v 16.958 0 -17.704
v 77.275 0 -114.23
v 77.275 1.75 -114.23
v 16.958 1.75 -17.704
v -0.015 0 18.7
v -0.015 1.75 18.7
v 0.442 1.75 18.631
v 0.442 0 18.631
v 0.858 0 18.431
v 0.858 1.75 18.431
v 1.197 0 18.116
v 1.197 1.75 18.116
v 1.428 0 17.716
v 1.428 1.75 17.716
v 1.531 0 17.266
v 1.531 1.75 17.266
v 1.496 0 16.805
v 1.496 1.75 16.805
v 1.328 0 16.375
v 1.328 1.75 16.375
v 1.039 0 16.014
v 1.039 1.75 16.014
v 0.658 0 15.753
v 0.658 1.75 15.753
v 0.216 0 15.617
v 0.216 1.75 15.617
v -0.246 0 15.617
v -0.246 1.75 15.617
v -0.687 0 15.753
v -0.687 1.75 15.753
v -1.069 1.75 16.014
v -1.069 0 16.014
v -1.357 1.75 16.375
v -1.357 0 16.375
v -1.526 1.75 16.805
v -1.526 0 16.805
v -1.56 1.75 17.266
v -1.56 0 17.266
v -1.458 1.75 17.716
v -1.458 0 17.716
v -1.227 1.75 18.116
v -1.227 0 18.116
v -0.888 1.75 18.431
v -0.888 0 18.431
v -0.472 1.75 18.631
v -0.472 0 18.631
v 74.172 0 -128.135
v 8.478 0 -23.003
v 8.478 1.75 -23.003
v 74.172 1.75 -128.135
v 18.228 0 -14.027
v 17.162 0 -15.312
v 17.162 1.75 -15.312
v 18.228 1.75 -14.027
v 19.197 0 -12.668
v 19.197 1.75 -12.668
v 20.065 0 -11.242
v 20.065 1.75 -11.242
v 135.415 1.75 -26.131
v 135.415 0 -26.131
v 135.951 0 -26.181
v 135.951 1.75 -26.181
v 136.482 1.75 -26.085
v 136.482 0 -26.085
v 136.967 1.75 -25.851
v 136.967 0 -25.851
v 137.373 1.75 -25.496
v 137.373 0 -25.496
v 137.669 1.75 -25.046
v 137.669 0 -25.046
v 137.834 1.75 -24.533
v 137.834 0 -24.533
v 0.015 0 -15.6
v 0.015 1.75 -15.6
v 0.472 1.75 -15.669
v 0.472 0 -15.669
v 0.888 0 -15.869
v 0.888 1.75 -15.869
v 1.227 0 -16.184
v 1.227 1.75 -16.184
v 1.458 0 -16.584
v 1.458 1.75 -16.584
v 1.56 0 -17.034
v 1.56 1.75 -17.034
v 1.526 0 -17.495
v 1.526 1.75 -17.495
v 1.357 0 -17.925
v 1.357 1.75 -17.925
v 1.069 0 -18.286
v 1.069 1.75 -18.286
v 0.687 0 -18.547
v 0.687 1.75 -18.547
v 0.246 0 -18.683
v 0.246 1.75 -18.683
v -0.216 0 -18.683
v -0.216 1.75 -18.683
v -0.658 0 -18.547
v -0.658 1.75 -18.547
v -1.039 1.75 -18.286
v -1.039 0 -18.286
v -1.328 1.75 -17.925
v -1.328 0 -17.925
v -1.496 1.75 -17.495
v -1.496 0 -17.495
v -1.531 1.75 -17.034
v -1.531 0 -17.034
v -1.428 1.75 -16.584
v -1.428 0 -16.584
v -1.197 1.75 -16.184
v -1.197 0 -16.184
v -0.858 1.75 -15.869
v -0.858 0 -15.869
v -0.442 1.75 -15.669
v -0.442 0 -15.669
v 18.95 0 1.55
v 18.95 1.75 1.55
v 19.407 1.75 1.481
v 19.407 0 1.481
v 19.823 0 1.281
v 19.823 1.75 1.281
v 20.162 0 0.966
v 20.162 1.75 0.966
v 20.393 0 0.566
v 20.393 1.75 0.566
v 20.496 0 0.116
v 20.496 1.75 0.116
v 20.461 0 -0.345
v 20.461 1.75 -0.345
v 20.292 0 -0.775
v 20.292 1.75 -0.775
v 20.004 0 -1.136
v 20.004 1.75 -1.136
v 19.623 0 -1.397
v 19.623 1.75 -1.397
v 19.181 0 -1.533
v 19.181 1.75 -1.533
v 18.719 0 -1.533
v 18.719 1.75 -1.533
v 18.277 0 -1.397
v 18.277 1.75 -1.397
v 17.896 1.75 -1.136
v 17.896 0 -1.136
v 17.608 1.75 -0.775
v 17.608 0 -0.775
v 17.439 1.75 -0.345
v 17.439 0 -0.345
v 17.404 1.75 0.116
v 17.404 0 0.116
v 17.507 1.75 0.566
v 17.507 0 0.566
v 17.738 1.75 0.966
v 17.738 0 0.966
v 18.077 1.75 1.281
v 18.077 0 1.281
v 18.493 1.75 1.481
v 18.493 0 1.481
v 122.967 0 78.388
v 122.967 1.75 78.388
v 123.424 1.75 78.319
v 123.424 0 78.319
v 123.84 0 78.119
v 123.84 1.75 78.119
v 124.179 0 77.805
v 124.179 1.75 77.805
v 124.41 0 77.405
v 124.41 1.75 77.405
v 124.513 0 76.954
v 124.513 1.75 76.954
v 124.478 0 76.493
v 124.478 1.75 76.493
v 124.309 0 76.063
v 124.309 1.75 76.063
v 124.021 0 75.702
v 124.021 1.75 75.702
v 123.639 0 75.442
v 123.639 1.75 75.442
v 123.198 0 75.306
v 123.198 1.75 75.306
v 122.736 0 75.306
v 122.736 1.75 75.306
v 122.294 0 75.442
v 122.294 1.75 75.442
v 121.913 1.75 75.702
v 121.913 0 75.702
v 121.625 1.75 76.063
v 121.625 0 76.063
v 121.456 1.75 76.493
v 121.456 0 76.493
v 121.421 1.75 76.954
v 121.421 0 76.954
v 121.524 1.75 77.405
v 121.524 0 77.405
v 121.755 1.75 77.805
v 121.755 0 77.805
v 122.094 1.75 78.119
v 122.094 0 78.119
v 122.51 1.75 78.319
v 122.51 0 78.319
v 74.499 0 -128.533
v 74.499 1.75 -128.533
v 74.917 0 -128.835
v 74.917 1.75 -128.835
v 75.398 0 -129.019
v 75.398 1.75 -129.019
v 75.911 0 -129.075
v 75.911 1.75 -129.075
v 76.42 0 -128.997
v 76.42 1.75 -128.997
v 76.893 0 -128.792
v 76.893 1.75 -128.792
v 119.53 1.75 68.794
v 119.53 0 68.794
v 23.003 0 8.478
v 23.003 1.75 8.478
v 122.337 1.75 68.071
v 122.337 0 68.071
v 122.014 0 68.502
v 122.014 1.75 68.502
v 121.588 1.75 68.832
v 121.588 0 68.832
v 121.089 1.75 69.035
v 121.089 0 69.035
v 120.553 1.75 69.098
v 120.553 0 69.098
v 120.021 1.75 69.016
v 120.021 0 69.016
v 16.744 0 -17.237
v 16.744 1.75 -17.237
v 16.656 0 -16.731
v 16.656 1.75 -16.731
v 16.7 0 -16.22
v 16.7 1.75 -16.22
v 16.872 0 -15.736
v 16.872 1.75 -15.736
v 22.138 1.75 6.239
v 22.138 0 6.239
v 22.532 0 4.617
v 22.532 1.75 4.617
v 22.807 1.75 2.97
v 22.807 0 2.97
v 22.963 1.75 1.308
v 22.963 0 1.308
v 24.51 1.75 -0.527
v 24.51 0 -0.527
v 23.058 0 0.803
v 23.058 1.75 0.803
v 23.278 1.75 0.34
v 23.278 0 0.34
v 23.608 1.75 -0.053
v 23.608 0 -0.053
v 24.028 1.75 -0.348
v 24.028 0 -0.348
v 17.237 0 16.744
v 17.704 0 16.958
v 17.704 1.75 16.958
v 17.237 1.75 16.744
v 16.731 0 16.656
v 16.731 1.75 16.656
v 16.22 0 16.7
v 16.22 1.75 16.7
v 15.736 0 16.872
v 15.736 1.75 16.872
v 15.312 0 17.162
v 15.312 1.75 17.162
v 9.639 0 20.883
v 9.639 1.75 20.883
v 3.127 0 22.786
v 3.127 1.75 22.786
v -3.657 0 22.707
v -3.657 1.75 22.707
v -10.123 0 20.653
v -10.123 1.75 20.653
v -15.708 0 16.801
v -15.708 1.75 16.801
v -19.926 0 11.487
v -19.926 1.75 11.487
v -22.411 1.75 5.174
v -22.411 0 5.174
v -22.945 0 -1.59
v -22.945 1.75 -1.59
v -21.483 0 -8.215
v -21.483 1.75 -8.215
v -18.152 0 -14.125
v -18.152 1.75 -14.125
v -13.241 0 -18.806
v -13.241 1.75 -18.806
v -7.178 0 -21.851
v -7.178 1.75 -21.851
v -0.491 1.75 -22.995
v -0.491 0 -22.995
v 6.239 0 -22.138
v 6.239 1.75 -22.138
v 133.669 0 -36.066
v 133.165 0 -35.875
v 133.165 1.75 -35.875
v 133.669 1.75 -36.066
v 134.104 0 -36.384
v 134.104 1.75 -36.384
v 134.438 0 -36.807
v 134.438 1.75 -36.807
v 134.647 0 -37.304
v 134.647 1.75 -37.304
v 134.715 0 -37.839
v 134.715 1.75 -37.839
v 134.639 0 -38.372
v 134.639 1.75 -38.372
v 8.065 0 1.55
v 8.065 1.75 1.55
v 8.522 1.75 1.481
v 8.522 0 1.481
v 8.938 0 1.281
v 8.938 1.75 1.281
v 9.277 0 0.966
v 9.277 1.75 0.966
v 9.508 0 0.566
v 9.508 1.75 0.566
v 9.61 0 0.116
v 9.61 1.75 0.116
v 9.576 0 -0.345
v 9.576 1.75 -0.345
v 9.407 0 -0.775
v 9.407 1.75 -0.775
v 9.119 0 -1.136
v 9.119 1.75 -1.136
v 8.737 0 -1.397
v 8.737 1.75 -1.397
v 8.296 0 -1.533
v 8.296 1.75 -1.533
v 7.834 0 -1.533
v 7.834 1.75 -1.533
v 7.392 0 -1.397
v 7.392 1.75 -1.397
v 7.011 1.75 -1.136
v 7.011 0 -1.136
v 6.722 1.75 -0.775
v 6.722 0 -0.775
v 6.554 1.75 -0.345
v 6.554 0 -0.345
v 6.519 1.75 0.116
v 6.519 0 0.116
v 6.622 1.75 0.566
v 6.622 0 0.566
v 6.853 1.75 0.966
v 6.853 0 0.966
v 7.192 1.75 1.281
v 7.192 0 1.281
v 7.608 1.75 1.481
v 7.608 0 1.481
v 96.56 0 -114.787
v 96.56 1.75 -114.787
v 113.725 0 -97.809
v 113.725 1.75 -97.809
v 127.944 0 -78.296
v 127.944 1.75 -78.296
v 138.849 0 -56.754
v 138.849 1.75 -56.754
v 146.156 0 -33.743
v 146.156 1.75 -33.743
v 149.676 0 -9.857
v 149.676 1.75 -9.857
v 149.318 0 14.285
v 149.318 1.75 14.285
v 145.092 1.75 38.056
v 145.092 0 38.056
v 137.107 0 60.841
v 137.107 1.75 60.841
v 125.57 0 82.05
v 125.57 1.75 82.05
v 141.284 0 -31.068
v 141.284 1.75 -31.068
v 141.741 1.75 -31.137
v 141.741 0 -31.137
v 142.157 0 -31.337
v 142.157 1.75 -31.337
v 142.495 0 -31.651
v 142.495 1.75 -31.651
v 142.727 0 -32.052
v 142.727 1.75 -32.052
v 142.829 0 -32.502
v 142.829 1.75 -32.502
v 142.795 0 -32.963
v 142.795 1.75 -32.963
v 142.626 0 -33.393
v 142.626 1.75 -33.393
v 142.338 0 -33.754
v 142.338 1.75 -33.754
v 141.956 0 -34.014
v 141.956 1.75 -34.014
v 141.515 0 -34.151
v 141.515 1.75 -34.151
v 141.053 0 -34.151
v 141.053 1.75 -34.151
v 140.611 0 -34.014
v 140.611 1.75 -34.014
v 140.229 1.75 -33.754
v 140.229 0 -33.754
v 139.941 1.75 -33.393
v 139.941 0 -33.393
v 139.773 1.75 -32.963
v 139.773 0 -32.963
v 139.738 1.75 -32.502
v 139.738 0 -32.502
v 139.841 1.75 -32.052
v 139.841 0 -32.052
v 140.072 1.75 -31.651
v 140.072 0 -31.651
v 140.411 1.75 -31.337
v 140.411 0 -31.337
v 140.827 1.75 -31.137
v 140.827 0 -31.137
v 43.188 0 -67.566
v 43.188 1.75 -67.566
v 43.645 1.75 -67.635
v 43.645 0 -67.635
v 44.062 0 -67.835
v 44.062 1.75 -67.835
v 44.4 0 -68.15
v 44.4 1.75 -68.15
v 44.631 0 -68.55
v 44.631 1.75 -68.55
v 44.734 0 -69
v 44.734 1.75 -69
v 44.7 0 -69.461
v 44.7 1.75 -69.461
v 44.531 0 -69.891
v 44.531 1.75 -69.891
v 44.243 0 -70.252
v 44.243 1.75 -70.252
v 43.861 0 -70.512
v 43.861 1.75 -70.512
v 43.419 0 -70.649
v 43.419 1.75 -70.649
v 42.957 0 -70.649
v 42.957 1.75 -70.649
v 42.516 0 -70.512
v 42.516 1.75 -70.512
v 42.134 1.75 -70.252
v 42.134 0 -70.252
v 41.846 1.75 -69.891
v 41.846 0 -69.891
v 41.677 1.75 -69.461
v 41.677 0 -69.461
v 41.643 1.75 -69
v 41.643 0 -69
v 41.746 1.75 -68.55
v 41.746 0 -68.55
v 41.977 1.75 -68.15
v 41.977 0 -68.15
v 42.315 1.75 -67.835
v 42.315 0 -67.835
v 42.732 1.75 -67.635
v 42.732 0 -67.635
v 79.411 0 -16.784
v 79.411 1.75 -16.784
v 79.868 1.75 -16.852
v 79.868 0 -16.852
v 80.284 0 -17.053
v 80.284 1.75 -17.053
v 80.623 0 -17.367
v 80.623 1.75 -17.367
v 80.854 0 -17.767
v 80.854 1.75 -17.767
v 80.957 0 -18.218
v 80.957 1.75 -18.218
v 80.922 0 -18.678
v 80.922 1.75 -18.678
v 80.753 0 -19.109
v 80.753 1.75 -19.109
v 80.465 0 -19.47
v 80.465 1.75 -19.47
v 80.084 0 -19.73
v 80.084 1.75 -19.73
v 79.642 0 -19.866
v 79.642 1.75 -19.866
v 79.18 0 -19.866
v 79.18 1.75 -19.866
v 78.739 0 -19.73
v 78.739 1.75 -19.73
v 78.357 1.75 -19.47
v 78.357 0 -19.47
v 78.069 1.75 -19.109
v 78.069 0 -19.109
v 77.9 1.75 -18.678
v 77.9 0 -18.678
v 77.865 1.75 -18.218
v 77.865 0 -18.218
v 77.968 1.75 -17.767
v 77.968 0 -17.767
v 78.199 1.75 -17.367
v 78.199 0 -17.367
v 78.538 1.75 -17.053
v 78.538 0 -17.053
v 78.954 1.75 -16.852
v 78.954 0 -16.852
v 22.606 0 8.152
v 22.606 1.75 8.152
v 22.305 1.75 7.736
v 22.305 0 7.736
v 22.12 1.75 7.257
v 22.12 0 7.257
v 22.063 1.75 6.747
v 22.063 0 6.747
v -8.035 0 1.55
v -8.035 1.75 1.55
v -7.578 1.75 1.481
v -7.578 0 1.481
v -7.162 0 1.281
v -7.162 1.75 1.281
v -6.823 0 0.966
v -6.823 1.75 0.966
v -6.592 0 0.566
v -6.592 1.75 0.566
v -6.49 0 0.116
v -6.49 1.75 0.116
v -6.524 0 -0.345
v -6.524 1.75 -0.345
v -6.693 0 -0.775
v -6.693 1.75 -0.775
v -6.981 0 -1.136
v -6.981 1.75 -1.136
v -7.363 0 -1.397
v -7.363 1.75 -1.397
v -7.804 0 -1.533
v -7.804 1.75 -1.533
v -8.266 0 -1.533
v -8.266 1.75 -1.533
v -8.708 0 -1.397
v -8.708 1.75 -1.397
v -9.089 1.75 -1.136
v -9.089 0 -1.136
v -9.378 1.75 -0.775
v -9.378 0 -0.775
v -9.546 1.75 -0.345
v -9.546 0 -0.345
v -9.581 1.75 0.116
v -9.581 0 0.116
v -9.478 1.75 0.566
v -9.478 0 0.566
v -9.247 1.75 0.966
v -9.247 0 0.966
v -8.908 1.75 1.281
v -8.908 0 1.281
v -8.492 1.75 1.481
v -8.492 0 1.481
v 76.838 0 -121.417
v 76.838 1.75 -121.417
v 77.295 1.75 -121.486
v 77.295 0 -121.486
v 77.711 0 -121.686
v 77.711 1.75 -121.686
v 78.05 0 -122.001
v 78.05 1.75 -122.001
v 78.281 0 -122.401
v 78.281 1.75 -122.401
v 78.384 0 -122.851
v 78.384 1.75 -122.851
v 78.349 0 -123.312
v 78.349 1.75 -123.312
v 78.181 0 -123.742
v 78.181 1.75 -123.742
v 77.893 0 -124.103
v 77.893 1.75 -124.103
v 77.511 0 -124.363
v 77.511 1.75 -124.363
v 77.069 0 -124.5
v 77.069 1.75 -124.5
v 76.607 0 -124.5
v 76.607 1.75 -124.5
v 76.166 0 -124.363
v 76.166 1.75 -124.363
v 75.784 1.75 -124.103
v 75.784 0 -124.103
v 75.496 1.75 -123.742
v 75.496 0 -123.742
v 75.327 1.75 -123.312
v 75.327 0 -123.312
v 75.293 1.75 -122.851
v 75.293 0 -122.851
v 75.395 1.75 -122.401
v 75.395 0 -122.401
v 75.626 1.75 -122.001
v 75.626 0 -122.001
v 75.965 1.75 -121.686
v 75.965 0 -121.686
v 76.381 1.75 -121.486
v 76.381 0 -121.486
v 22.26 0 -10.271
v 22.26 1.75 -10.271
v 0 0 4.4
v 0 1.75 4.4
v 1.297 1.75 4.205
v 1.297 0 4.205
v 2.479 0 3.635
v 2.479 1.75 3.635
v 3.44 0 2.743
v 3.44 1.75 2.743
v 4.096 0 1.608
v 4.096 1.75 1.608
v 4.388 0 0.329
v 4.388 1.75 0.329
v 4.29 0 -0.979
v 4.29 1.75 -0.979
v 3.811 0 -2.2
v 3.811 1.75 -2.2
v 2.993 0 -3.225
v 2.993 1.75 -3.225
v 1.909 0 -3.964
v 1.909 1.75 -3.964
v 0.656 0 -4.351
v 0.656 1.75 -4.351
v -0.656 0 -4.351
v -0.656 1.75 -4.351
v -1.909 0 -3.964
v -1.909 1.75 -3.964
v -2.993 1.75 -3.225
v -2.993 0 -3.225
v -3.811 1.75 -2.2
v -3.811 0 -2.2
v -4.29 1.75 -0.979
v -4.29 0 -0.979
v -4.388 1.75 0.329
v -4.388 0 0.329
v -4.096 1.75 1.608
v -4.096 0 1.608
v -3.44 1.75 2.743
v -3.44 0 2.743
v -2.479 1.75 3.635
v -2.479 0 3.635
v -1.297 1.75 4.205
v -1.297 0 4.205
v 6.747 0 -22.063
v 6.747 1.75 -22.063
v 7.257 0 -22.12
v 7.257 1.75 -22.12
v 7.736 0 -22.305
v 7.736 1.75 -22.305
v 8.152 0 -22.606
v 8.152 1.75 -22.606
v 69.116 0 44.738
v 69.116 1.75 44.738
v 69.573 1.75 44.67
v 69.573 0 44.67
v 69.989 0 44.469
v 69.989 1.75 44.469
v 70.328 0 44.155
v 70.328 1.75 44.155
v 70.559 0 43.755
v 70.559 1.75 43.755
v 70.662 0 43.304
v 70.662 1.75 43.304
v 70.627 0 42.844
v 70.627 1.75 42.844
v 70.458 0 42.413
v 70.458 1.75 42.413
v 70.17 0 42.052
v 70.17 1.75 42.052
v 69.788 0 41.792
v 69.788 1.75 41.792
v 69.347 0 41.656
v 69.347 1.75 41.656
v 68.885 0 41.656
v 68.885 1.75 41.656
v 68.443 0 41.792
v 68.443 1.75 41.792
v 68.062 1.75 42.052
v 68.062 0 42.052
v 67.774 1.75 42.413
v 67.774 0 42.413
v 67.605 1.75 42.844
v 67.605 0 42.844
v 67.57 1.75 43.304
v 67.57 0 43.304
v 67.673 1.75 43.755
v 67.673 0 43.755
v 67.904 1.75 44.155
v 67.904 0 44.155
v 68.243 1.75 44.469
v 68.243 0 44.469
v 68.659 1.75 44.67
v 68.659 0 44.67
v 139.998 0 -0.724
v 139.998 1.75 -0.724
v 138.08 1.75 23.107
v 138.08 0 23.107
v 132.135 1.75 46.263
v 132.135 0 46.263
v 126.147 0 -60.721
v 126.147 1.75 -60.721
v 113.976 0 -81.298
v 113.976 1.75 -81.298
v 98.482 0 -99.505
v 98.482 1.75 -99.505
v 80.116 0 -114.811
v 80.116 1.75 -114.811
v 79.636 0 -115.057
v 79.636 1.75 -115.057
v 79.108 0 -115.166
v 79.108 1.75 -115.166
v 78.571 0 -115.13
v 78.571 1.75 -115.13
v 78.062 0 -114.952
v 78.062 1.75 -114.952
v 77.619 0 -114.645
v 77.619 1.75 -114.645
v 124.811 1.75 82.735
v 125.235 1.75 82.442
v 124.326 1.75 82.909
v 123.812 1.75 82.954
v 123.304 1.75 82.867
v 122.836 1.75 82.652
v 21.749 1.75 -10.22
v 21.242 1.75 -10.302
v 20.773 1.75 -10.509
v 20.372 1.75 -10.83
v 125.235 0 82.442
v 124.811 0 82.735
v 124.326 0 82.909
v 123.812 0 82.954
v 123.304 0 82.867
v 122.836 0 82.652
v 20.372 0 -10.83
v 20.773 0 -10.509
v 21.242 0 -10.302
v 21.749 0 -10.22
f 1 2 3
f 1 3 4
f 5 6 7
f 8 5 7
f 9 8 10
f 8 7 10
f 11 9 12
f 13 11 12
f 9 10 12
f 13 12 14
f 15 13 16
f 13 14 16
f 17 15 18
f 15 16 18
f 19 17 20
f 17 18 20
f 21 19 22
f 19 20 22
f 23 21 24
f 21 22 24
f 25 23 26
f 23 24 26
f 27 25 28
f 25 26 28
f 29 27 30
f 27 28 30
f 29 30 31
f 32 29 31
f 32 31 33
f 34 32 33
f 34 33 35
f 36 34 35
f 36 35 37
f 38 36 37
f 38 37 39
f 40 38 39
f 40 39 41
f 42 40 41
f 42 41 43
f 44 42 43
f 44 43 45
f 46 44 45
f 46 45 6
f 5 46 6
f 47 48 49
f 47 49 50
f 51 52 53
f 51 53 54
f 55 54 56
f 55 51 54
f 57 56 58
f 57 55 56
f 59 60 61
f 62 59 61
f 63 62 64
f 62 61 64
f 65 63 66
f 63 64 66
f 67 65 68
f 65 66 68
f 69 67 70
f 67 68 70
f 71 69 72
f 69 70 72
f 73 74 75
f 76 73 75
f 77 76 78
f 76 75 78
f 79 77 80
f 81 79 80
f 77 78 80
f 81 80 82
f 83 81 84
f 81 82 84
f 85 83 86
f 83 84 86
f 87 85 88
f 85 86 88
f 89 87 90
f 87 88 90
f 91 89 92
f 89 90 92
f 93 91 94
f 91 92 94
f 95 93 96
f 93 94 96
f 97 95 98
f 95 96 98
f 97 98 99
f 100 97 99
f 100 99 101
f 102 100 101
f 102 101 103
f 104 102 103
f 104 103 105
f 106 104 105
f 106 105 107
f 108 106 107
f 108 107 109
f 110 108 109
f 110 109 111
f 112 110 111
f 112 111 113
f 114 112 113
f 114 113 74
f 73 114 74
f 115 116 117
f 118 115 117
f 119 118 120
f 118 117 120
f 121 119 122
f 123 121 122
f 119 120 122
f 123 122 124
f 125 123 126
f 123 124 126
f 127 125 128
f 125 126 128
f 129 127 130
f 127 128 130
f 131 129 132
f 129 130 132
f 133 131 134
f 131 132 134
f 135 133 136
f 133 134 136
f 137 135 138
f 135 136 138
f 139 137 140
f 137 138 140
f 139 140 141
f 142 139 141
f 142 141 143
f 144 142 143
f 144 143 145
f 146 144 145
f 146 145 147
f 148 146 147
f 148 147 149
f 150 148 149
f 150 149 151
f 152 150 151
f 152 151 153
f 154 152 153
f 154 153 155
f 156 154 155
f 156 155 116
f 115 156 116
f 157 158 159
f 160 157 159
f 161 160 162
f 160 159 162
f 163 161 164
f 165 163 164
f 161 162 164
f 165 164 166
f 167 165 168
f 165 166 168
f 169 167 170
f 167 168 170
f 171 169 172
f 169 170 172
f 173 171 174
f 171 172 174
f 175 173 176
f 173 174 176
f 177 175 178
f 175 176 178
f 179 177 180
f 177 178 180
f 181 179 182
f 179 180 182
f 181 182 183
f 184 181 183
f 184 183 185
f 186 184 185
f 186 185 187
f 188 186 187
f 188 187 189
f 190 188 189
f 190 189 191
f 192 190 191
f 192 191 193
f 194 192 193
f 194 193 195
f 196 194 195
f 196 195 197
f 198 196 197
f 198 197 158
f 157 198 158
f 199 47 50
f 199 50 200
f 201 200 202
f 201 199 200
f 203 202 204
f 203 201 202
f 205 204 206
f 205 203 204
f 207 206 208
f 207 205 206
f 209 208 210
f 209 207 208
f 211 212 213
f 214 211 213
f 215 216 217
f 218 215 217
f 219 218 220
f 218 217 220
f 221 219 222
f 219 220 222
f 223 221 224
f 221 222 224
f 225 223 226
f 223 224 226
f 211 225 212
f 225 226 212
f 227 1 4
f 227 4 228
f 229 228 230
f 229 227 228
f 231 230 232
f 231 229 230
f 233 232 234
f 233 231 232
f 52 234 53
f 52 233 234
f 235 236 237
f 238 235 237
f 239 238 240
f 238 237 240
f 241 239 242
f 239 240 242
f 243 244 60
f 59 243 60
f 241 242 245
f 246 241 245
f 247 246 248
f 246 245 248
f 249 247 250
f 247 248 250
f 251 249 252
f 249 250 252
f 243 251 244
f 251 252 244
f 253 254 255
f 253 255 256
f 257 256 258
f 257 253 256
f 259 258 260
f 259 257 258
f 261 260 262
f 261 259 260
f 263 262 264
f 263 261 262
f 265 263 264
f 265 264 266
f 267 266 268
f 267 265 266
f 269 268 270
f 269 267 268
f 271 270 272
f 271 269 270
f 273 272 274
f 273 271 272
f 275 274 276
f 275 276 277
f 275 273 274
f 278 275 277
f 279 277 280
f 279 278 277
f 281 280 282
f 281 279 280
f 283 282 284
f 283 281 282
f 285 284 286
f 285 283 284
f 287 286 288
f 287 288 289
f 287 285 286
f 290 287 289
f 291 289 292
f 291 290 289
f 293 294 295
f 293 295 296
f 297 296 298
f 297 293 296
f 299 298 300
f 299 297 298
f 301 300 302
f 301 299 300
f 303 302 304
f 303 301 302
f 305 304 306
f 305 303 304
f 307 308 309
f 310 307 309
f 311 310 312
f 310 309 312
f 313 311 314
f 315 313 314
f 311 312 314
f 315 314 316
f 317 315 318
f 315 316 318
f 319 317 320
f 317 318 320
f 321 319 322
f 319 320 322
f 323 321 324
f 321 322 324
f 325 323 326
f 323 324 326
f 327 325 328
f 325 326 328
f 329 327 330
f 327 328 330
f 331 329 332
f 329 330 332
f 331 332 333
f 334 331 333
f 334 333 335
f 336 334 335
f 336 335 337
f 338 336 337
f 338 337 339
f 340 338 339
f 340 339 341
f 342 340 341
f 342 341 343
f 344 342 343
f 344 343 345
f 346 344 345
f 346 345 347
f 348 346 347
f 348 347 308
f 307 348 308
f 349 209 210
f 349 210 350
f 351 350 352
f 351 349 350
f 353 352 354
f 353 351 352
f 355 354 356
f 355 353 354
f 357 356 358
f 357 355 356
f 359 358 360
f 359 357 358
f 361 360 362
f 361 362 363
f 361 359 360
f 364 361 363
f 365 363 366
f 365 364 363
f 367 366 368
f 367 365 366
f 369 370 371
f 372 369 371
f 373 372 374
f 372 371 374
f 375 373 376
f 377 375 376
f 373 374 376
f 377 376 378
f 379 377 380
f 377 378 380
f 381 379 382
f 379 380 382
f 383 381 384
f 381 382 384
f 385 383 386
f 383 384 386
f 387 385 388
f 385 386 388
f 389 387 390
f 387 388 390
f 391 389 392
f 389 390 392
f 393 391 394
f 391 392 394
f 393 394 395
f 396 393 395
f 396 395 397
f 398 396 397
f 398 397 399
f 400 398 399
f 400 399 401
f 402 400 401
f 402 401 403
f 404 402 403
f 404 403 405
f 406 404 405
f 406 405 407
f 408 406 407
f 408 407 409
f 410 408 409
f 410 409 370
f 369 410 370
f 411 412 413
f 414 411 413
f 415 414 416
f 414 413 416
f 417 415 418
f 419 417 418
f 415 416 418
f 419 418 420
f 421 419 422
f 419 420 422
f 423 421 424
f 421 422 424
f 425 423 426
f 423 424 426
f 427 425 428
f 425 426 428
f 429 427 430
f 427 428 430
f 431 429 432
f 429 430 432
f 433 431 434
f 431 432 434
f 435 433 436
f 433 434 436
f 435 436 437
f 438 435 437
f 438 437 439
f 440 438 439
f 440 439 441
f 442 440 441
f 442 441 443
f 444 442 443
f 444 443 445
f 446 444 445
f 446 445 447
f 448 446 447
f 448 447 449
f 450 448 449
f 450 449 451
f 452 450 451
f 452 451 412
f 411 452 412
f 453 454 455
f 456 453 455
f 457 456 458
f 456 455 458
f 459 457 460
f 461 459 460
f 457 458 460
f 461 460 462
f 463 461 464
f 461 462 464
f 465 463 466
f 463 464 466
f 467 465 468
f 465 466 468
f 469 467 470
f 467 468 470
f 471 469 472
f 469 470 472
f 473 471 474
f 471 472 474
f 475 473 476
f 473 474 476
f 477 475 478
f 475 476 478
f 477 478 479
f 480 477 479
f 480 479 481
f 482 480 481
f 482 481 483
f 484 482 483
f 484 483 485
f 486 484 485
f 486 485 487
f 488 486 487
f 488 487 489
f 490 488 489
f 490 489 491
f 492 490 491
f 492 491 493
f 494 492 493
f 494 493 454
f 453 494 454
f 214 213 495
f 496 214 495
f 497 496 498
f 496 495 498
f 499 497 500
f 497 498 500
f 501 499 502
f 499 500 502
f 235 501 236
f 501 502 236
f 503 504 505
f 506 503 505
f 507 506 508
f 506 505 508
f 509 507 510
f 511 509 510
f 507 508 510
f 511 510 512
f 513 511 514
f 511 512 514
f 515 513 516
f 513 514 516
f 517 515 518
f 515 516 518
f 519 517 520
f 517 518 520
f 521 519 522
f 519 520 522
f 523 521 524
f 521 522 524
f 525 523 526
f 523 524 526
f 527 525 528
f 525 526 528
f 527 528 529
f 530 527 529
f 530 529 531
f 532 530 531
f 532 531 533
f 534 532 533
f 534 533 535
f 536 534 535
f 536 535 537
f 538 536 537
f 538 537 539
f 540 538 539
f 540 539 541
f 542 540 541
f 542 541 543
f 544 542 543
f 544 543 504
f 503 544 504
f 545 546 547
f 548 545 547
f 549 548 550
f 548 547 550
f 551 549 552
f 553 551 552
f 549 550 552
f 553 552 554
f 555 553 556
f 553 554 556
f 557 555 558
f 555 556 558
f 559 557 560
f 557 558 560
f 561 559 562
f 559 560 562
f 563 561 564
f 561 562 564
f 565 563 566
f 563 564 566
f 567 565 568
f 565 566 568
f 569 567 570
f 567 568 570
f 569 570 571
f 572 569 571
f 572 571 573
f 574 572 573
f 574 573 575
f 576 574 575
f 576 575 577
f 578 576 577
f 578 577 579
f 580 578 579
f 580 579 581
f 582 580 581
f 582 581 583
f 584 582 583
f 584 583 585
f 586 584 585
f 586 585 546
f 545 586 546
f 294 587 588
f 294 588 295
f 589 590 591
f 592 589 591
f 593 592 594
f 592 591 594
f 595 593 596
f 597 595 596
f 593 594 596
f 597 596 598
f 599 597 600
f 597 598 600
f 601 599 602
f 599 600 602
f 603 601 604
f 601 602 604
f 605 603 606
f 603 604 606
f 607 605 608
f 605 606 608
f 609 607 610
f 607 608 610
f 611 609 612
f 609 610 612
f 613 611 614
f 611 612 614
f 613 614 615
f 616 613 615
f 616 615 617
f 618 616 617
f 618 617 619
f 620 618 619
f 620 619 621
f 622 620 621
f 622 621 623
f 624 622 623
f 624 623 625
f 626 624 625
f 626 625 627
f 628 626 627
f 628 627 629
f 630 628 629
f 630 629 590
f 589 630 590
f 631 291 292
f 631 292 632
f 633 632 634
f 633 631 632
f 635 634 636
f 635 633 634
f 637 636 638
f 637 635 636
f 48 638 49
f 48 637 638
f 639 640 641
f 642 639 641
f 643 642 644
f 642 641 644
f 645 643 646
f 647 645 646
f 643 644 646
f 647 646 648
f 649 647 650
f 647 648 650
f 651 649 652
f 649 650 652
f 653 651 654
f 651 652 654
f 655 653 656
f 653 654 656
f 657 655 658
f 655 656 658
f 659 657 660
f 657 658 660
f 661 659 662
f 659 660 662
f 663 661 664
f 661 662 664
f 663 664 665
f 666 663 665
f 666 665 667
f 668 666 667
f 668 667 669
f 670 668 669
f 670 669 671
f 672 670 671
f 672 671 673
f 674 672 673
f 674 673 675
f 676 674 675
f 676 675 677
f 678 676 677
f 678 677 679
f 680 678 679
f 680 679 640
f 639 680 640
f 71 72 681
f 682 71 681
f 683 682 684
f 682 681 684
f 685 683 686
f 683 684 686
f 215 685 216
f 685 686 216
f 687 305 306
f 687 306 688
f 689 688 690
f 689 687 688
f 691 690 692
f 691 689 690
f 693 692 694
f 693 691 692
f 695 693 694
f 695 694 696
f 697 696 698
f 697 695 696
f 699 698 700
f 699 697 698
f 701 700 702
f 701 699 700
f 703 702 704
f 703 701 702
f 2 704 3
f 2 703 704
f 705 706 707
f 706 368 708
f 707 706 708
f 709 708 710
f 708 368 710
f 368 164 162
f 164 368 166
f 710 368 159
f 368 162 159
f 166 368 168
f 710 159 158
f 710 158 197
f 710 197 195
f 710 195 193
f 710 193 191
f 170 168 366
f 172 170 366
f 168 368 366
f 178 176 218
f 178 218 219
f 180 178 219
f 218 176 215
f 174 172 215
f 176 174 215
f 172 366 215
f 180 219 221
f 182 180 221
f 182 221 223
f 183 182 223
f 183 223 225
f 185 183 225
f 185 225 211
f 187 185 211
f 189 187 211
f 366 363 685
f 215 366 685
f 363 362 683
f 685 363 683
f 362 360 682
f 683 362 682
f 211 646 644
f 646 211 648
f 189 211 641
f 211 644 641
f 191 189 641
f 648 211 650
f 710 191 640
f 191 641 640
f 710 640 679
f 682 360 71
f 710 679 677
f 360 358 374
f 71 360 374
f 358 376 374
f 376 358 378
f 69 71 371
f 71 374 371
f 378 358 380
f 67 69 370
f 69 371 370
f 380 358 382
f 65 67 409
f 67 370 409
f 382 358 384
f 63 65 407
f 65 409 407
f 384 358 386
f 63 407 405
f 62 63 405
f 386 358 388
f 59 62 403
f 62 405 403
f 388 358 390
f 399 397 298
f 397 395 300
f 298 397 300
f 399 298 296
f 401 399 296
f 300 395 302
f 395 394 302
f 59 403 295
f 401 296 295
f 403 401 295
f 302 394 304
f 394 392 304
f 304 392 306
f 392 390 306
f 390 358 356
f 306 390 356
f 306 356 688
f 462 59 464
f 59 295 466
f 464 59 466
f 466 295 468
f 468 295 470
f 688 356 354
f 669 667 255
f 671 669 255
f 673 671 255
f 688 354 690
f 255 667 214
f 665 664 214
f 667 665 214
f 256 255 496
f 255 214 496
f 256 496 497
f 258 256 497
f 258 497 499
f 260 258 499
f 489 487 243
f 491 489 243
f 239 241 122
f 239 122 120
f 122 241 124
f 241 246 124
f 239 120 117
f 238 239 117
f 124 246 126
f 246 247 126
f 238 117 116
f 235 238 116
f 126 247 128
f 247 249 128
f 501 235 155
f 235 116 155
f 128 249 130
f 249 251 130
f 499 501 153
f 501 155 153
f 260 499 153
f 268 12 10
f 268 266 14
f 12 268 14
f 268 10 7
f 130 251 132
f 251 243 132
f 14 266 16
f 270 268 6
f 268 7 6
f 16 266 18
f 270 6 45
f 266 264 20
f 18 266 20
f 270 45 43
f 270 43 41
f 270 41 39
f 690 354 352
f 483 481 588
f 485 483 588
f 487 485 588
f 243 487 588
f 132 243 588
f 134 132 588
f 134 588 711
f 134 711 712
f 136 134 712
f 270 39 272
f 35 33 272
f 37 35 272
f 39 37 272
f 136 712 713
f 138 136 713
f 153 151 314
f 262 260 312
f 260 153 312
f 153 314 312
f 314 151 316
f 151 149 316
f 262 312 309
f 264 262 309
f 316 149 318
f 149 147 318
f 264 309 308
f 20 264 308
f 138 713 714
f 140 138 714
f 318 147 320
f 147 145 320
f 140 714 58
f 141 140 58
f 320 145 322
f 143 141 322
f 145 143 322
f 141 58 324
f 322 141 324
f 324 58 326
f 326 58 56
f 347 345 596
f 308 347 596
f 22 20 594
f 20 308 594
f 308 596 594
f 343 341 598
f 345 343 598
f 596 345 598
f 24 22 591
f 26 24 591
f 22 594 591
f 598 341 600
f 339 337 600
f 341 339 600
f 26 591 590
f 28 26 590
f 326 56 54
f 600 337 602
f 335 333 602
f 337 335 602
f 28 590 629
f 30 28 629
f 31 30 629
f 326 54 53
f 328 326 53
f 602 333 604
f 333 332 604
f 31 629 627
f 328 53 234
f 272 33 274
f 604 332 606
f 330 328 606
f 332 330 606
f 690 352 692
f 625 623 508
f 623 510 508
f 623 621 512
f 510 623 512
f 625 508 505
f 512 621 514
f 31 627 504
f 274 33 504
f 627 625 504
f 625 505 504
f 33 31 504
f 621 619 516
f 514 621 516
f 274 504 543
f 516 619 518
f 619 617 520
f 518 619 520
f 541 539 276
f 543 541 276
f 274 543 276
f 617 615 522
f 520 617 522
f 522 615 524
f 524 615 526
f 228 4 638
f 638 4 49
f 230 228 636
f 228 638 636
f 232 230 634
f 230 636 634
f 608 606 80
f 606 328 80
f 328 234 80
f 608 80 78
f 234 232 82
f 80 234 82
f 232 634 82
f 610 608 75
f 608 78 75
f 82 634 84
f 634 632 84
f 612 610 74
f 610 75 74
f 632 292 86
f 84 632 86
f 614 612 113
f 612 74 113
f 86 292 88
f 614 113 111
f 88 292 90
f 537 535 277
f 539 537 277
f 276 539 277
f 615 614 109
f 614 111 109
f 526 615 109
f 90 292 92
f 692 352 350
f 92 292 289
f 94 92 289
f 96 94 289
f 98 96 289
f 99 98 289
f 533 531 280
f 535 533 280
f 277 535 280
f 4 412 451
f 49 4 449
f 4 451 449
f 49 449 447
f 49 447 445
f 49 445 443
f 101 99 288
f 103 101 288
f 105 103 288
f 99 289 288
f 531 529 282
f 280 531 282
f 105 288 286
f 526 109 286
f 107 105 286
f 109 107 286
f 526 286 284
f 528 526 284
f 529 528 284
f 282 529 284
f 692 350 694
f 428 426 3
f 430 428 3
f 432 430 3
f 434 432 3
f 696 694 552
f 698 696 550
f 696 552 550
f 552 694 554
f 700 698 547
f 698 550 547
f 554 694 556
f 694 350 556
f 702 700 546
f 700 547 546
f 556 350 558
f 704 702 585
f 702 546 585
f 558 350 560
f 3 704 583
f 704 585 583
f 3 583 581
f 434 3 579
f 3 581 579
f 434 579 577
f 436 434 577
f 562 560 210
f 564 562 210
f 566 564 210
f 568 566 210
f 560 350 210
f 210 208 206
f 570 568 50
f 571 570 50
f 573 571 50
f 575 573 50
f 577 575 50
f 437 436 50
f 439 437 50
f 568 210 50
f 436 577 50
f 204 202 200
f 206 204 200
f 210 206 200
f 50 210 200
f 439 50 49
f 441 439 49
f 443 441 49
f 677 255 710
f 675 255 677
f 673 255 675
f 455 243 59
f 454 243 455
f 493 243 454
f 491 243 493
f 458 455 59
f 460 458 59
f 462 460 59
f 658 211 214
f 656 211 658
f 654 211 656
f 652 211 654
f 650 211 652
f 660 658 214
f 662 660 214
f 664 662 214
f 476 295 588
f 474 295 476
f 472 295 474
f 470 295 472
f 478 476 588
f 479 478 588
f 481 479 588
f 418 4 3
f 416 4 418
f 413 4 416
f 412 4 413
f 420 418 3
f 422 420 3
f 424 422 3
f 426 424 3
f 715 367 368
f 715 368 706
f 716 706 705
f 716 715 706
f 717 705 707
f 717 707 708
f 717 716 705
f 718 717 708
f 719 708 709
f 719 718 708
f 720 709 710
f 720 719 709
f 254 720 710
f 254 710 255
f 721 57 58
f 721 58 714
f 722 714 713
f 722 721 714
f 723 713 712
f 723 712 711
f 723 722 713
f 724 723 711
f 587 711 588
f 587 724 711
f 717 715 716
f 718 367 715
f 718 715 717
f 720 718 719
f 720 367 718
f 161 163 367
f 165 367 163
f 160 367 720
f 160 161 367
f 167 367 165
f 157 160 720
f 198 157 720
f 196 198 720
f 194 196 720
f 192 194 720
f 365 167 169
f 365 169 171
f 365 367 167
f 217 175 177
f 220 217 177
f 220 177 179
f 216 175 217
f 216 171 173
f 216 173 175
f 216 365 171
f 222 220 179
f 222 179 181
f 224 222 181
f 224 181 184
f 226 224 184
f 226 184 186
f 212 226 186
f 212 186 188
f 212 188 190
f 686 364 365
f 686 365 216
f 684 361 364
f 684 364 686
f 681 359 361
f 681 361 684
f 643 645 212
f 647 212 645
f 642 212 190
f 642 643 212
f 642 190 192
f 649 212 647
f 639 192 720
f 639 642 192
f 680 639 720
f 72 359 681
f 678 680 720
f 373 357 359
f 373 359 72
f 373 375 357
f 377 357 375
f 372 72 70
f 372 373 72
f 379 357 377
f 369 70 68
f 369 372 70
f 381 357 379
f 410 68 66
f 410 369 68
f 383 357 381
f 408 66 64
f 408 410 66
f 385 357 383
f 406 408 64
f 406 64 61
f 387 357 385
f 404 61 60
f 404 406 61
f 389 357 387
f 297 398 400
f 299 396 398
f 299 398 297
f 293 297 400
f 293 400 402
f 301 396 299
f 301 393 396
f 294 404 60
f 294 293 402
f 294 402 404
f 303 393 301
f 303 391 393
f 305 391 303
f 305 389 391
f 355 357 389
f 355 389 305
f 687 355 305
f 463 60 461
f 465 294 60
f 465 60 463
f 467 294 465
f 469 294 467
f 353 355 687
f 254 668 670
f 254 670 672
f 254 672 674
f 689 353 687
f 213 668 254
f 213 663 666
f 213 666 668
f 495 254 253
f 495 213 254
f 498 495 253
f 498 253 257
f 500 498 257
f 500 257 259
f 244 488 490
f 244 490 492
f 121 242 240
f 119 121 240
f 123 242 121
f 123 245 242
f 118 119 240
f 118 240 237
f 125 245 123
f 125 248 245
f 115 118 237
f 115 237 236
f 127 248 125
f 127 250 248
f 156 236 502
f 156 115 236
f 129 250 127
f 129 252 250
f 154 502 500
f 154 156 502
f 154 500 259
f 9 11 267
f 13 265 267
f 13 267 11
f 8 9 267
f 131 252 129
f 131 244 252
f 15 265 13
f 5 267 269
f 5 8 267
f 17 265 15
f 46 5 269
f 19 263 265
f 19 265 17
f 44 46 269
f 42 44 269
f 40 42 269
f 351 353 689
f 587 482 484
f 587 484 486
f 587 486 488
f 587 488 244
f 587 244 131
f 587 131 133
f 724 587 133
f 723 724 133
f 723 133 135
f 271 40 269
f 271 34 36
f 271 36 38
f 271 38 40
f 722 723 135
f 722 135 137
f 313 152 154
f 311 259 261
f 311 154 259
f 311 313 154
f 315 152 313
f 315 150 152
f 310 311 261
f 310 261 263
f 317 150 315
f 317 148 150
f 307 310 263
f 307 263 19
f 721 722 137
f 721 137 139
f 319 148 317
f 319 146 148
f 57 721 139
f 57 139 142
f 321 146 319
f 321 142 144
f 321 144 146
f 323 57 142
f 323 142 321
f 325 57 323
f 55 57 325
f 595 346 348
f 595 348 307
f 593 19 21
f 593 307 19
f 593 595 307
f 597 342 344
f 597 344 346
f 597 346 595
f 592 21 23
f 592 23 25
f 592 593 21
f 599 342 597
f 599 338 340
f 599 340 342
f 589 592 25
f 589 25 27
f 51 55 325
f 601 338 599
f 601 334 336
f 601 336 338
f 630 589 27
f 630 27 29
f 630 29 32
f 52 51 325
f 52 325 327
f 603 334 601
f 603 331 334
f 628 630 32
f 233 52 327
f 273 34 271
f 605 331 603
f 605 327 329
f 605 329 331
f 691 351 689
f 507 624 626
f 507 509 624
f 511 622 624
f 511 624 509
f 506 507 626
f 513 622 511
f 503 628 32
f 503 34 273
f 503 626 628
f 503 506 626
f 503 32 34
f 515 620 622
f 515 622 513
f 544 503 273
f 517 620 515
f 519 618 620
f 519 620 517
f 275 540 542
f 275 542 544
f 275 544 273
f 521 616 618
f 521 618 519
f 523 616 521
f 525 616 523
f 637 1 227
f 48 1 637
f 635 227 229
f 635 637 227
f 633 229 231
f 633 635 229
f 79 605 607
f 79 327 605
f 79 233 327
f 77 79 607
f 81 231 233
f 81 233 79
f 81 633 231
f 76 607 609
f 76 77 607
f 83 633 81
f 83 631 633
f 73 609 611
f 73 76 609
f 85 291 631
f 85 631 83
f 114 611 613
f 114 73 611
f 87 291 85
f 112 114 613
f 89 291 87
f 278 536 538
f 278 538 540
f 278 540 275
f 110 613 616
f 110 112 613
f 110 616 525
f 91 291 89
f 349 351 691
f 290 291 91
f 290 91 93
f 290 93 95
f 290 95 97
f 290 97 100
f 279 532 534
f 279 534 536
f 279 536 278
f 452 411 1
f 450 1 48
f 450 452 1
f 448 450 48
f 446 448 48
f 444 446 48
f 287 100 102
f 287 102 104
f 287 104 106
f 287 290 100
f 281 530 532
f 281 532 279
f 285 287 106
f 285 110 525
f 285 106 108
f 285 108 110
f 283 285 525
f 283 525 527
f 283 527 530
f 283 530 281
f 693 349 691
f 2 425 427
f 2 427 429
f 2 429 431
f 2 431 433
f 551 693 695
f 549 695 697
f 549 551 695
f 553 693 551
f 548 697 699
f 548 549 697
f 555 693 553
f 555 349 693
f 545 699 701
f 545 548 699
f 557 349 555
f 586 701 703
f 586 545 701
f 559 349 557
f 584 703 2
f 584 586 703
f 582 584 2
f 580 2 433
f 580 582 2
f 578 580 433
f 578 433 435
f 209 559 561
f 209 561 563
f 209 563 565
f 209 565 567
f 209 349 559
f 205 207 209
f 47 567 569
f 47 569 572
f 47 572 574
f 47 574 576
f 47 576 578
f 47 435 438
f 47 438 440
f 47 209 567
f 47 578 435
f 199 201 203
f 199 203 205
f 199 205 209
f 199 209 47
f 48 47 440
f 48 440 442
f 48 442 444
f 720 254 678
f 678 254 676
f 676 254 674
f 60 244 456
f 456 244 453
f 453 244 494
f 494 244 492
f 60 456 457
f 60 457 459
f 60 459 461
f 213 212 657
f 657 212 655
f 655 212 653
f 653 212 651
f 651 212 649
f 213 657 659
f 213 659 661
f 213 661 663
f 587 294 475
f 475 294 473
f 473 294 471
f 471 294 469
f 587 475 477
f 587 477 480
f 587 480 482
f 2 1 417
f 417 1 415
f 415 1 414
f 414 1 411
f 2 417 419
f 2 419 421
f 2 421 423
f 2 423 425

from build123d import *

# Parameters (mm, degrees)
BOSS_EXTRUDE1_DEPTH  = 1.75
MOUNTING_HOLES_REACH = 199.898
SKETCH2_R            = 4.4
SKETCH2_R_2          = 1.55


with BuildPart() as part:
    # Sketch1 → Boss-Extrude1 (new body)
    with BuildSketch(Plane(origin=(0, 0, 0), x_dir=(1, 0, 0), z_dir=(0, 1, 0))):
        with BuildLine():
            Line((8.477821861, 23.002750629), (74.17169656, 128.134926657))
            ThreePointArc((74.17169656, 128.134926657), (75.398161995, 129.019168104), (76.893033195, 128.792319049))
            ThreePointArc((76.893033195, 128.792319049), (146.155509718, 33.742658152), (125.569837037, -82.050082429))
            ThreePointArc((125.569837037, -82.050082429), (124.325699782, -82.909281411), (122.835734015, -82.652177522))
            Line((122.835734015, -82.652177522), (17.703557987, -16.958302822))
            ThreePointArc((17.703557987, -16.958302822), (16.473932566, -16.661618944), (15.312221901, -17.162047094))
            ThreePointArc((15.312221901, -17.162047094), (-22.41051149, -5.17387425), (6.239187615, 22.137582025))
            ThreePointArc((6.239187615, 22.137582025), (7.502699505, 22.197060619), (8.477821861, 23.002750629))
        make_face()
        with BuildLine():
            Line((22.260126283, 10.270675628), (133.165216263, 35.875133138))
            ThreePointArc((133.165216263, 35.875133138), (134.43775302, 36.807406666), (134.638724504, 38.372045344))
            ThreePointArc((134.638724504, 38.372045344), (113.97617257, 81.2984138), (80.115562712, 114.810699028))
            ThreePointArc((80.115562712, 114.810699028), (78.570737863, 115.130073284), (77.274958481, 114.230384713))
            Line((77.274958481, 114.230384713), (16.958302822, 17.703557987))
            ThreePointArc((16.958302822, 17.703557987), (16.661618944, 16.473932566), (17.162047094, 15.312221901))
            ThreePointArc((17.162047094, 15.312221901), (18.724656922, 13.356167981), (20.06540624, 11.241862497))
            ThreePointArc((20.06540624, 11.241862497), (21.000901784, 10.390482389), (22.260126283, 10.270675628))
        make_face(mode=Mode.SUBTRACT)
        with BuildLine():
            Line((24.509636827, 0.52697498), (135.414726806, 26.131432491))
            ThreePointArc((135.414726806, 26.131432491), (136.967157083, 25.851353992), (137.833681508, 24.533166163))
            ThreePointArc((137.833681508, 24.533166163), (138.079984215, -23.10666482), (122.337088578, -68.070821636))
            ThreePointArc((122.337088578, -68.070821636), (121.08861366, -69.035079956), (119.529577356, -68.794477519))
            Line((119.529577356, -68.794477519), (23.002750629, -8.477821861))
            ThreePointArc((23.002750629, -8.477821861), (22.197060619, -7.502699505), (22.137582025, -6.239187615))
            ThreePointArc((22.137582025, -6.239187615), (22.684568835, -3.796094935), (22.96277582, -1.308023937))
            ThreePointArc((22.96277582, -1.308023937), (23.430373171, -0.132714311), (24.509636827, 0.52697498))
        make_face(mode=Mode.SUBTRACT)
    extrude(amount=BOSS_EXTRUDE1_DEPTH)

    # Sketch2 → Mounting_Holes (cut, up to next)
    with BuildSketch(Plane(origin=(0, 1.75, 0), x_dir=(1, 0, 0), z_dir=(0, 1, 0)), mode=Mode.PRIVATE) as mounting_holes_sk1:
        with Locations(Location((0, 0, 0), (0, 0, 270))):
            Circle(SKETCH2_R)
    mounting_holes_tool1 = extrude(mounting_holes_sk1.sketch, amount=-MOUNTING_HOLES_REACH, mode=Mode.PRIVATE) & part.part
    # Sketch2 → Mounting_Holes (cut, up to next)
    with BuildSketch(Plane(origin=(0, 1.75, 0), x_dir=(1, 0, 0), z_dir=(0, 1, 0)), mode=Mode.PRIVATE) as mounting_holes_sk2:
        with Locations(Location((8.064784864, 0, 0), (0, 0, 270))):
            Circle(SKETCH2_R_2)
    mounting_holes_tool2 = extrude(mounting_holes_sk2.sketch, amount=-MOUNTING_HOLES_REACH, mode=Mode.PRIVATE) & part.part
    # Sketch2 → Mounting_Holes (cut, up to next)
    with BuildSketch(Plane(origin=(0, 1.75, 0), x_dir=(1, 0, 0), z_dir=(0, 1, 0)), mode=Mode.PRIVATE) as mounting_holes_sk3:
        with Locations(Location((18.95, 0, 0), (0, 0, 270))):
            Circle(SKETCH2_R_2)
    mounting_holes_tool3 = extrude(mounting_holes_sk3.sketch, amount=-MOUNTING_HOLES_REACH, mode=Mode.PRIVATE) & part.part
    # Sketch2 → Mounting_Holes (cut, up to next)
    with BuildSketch(Plane(origin=(0, 1.75, 0), x_dir=(1, 0, 0), z_dir=(0, 1, 0)), mode=Mode.PRIVATE) as mounting_holes_sk4:
        with Locations(Location((-8.035215136, 0, 0), (0, 0, 270))):
            Circle(SKETCH2_R_2)
    mounting_holes_tool4 = extrude(mounting_holes_sk4.sketch, amount=-MOUNTING_HOLES_REACH, mode=Mode.PRIVATE) & part.part
    # Sketch2 → Mounting_Holes (cut, up to next)
    with BuildSketch(Plane(origin=(0, 1.75, 0), x_dir=(1, 0, 0), z_dir=(0, 1, 0)), mode=Mode.PRIVATE) as mounting_holes_sk5:
        with Locations(Location((0.014784864, 17.15, 0), (0, 0, 270))):
            Circle(SKETCH2_R_2)
    mounting_holes_tool5 = extrude(mounting_holes_sk5.sketch, amount=-MOUNTING_HOLES_REACH, mode=Mode.PRIVATE) & part.part
    # Sketch2 → Mounting_Holes (cut, up to next)
    with BuildSketch(Plane(origin=(0, 1.75, 0), x_dir=(1, 0, 0), z_dir=(0, 1, 0)), mode=Mode.PRIVATE) as mounting_holes_sk6:
        with Locations(Location((-0.014784864, -17.15, 0), (0, 0, 270))):
            Circle(SKETCH2_R_2)
    mounting_holes_tool6 = extrude(mounting_holes_sk6.sketch, amount=-MOUNTING_HOLES_REACH, mode=Mode.PRIVATE) & part.part
    # Sketch2 → Mounting_Holes (cut, up to next)
    with BuildSketch(Plane(origin=(0, 1.75, 0), x_dir=(1, 0, 0), z_dir=(0, 1, 0)), mode=Mode.PRIVATE) as mounting_holes_sk7:
        with Locations(Location((69.115919837, -43.188420035, 0), (0, 0, 270))):
            Circle(SKETCH2_R_2)
    mounting_holes_tool7 = extrude(mounting_holes_sk7.sketch, amount=-MOUNTING_HOLES_REACH, mode=Mode.PRIVATE) & part.part
    # Sketch2 → Mounting_Holes (cut, up to next)
    with BuildSketch(Plane(origin=(0, 1.75, 0), x_dir=(1, 0, 0), z_dir=(0, 1, 0)), mode=Mode.PRIVATE) as mounting_holes_sk8:
        with Locations(Location((122.966973943, -76.838293314, 0), (0, 0, 270))):
            Circle(SKETCH2_R_2)
    mounting_holes_tool8 = extrude(mounting_holes_sk8.sketch, amount=-MOUNTING_HOLES_REACH, mode=Mode.PRIVATE) & part.part
    # Sketch2 → Mounting_Holes (cut, up to next)
    with BuildSketch(Plane(origin=(0, 1.75, 0), x_dir=(1, 0, 0), z_dir=(0, 1, 0)), mode=Mode.PRIVATE) as mounting_holes_sk9:
        with Locations(Location((141.283659394, 32.61790288, 0), (0, 0, 270))):
            Circle(SKETCH2_R_2)
    mounting_holes_tool9 = extrude(mounting_holes_sk9.sketch, amount=-MOUNTING_HOLES_REACH, mode=Mode.PRIVATE) & part.part
    # Sketch2 → Mounting_Holes (cut, up to next)
    with BuildSketch(Plane(origin=(0, 1.75, 0), x_dir=(1, 0, 0), z_dir=(0, 1, 0)), mode=Mode.PRIVATE) as mounting_holes_sk10:
        with Locations(Location((79.41116028, 18.333510929, 0), (0, 0, 270))):
            Circle(SKETCH2_R_2)
    mounting_holes_tool10 = extrude(mounting_holes_sk10.sketch, amount=-MOUNTING_HOLES_REACH, mode=Mode.PRIVATE) & part.part
    # Sketch2 → Mounting_Holes (cut, up to next)
    with BuildSketch(Plane(origin=(0, 1.75, 0), x_dir=(1, 0, 0), z_dir=(0, 1, 0)), mode=Mode.PRIVATE) as mounting_holes_sk11:
        with Locations(Location((43.188420035, 69.115919837, 0), (0, 0, 270))):
            Circle(SKETCH2_R_2)
    mounting_holes_tool11 = extrude(mounting_holes_sk11.sketch, amount=-MOUNTING_HOLES_REACH, mode=Mode.PRIVATE) & part.part
    # Sketch2 → Mounting_Holes (cut, up to next)
    with BuildSketch(Plane(origin=(0, 1.75, 0), x_dir=(1, 0, 0), z_dir=(0, 1, 0)), mode=Mode.PRIVATE) as mounting_holes_sk12:
        with Locations(Location((76.838293314, 122.966973943, 0), (0, 0, 270))):
            Circle(SKETCH2_R_2)
    mounting_holes_tool12 = extrude(mounting_holes_sk12.sketch, amount=-MOUNTING_HOLES_REACH, mode=Mode.PRIVATE) & part.part
    add(mounting_holes_tool1.solids().sort_by_distance((0, 1.75, 0))[0], mode=Mode.SUBTRACT)
    add(mounting_holes_tool2.solids().sort_by_distance((8.064785, 1.75, 0))[0], mode=Mode.SUBTRACT)
    add(mounting_holes_tool3.solids().sort_by_distance((18.95, 1.75, 0))[0], mode=Mode.SUBTRACT)
    add(mounting_holes_tool4.solids().sort_by_distance((-8.035215, 1.75, 0))[0], mode=Mode.SUBTRACT)
    add(mounting_holes_tool5.solids().sort_by_distance((0.014785, 1.75, -17.15))[0], mode=Mode.SUBTRACT)
    add(mounting_holes_tool6.solids().sort_by_distance((-0.014785, 1.75, 17.15))[0], mode=Mode.SUBTRACT)
    add(mounting_holes_tool7.solids().sort_by_distance((69.11592, 1.75, 43.18842))[0], mode=Mode.SUBTRACT)
    add(mounting_holes_tool8.solids().sort_by_distance((122.966974, 1.75, 76.838293))[0], mode=Mode.SUBTRACT)
    add(mounting_holes_tool9.solids().sort_by_distance((141.283659, 1.75, -32.617903))[0], mode=Mode.SUBTRACT)
    add(mounting_holes_tool10.solids().sort_by_distance((79.41116, 1.75, -18.333511))[0], mode=Mode.SUBTRACT)
    add(mounting_holes_tool11.solids().sort_by_distance((43.18842, 1.75, -69.11592))[0], mode=Mode.SUBTRACT)
    add(mounting_holes_tool12.solids().sort_by_distance((76.838293, 1.75, -122.966974))[0], mode=Mode.SUBTRACT)


solid = part.part
